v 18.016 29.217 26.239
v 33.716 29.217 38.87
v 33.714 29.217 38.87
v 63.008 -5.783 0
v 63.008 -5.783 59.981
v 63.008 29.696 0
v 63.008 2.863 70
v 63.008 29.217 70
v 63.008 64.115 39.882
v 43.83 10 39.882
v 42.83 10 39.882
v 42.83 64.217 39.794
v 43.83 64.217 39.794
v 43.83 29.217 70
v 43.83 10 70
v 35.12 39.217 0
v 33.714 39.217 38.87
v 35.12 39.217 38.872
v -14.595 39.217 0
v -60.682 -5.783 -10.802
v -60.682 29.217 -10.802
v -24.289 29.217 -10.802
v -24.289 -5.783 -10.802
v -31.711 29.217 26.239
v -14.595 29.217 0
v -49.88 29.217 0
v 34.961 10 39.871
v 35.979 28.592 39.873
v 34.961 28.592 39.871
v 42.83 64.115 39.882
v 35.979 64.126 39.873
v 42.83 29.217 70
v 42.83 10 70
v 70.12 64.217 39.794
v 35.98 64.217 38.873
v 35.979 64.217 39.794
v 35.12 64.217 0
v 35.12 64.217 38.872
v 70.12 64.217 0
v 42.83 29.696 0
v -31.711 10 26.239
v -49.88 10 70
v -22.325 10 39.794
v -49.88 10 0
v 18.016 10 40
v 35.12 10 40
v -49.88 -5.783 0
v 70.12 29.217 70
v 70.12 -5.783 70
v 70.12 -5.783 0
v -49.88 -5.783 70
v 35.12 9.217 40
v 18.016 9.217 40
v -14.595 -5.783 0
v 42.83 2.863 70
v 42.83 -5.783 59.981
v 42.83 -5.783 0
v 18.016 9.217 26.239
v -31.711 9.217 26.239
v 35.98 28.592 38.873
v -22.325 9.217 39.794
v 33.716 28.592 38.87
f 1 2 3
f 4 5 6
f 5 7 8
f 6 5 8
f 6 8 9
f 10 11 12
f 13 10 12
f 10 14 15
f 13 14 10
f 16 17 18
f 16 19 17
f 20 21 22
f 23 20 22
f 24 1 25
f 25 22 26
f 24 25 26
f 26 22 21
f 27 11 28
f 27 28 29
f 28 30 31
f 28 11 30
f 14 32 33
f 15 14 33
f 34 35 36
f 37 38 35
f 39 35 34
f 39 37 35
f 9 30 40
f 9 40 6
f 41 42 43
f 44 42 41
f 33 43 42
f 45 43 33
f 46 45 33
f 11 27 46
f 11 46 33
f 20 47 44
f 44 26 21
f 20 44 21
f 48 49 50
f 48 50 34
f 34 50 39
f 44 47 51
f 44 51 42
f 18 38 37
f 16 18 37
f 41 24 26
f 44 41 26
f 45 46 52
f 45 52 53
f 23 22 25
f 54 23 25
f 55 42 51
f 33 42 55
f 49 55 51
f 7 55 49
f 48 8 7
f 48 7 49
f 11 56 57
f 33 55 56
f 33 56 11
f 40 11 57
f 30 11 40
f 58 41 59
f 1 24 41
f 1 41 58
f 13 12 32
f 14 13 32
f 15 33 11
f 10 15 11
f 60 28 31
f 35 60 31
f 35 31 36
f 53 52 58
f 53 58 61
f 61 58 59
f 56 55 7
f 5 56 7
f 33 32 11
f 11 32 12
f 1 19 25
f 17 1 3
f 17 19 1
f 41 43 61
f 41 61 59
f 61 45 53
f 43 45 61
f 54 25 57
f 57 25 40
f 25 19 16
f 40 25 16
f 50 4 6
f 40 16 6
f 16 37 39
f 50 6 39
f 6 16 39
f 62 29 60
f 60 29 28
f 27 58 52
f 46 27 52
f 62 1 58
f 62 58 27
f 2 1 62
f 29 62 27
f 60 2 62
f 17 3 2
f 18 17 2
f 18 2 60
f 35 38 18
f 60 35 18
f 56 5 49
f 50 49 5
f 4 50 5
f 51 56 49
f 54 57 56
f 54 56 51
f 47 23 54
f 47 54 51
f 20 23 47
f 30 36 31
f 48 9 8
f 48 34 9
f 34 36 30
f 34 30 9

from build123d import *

# Parameters (mm, degrees)
SKETCH1_W           = 120
SKETCH1_H           = 70
BOSS_EXTRUDE1_DEPTH = 70
CUT_EXTRUDE1_DEPTH  = 150
SKETCH5_W           = 20.177747719
SKETCH5_H           = 66.048531366
CUT_EXTRUDE3_DEPTH  = 150
CUT_EXTRUDE4_DEPTH  = 25
CUT_EXTRUDE5_DEPTH  = 35
BOSS_EXTRUDE2_DEPTH = 35
CUT_EXTRUDE6_DEPTH  = 55
SKETCH14_W          = 58.303279042
SKETCH14_H          = 35.625039804
CUT_EXTRUDE7_DEPTH  = 1
BOSS_EXTRUDE5_DEPTH = 1
CUT_EXTRUDE9_DEPTH  = 20
CUT_EXTRUDE10_DEPTH = 20


with BuildPart() as part:
    # Sketch1 → Boss-Extrude1 (new body)
    with BuildSketch(Plane.XY):
        with Locations((10.120481928, 29.21686747)):
            Rectangle(SKETCH1_W, SKETCH1_H)
    extrude(amount=BOSS_EXTRUDE1_DEPTH)

    # Sketch3 → Cut-Extrude1 (cut)
    with BuildSketch(Plane(origin=(70.120481928, 0, 0), x_dir=(0, 0, -1), z_dir=(1, 0, 0))):
        Polygon((-39.794288679, 64.21686747), (-70, 29.21686747), (-70, 64.21686747), align=None)
    extrude(amount=-CUT_EXTRUDE1_DEPTH, mode=Mode.SUBTRACT)

    # Sketch5 → Cut-Extrude3 (cut)
    with BuildSketch(Plane(origin=(0, 47.095410713, 54.570453827), x_dir=(1, 0, 0), z_dir=(0, 0.653352699, 0.757053665))):
        with Locations((52.91919907, -10.542758773)):
            Rectangle(SKETCH5_W, SKETCH5_H)
    extrude(amount=-CUT_EXTRUDE3_DEPTH, mode=Mode.SUBTRACT)

    # Sketch6 → Cut-Extrude4 (cut)
    with BuildSketch(Plane(origin=(0, 64.21686747, 0), x_dir=(1, 0, 0), z_dir=(0, 1, 0))):
        Polygon((35.120481928, 0), (-14.879518072, 0), (35.120481928, -40), align=None)
    extrude(amount=-CUT_EXTRUDE4_DEPTH, mode=Mode.SUBTRACT)

    # Sketch9 → Cut-Extrude5 (cut)
    with BuildSketch(Plane(origin=(0, 64.21686747, 0), x_dir=(1, 0, 0), z_dir=(0, 1, 0))):
        Polygon((12.260999006, -39.794288679), (-22.324601561, -39.794288679), (-49.879518072, 0), (-58.507323934, 12.460113859), (-30.081695552, 12.460113859), (34.863342776, -39.794288679), align=None)
    extrude(amount=-CUT_EXTRUDE5_DEPTH, mode=Mode.SUBTRACT)

    # Sketch10 → Boss-Extrude2 (add)
    with BuildSketch(Plane(origin=(0, 29.21686747, 0), x_dir=(1, 0, 0), z_dir=(0, 1, 0))):
        Polygon((-49.879518072, 0), (-60.681640724, 10.802122652), (-24.289355103, 10.802122652), (-14.595487063, 0), align=None)
    extrude(amount=-BOSS_EXTRUDE2_DEPTH)

    # Sketch13 → Cut-Extrude6 (cut)
    with BuildSketch(Plane(origin=(0, 65, 0), x_dir=(1, 0, 0), z_dir=(0, 1, 0))):
        Polygon((-49.879518072, 0), (-49.879518072, -70), (42.83032521, -70), (42.83032521, -39.882100619), (-22.324601561, -39.794288679), align=None)
    extrude(amount=-CUT_EXTRUDE6_DEPTH, mode=Mode.SUBTRACT)

    # Sketch14 → Cut-Extrude7 (cut)
    with BuildSketch(Plane(origin=(-0.053672831, 0, 39.824304114), x_dir=(0.999999092, 0, 0.001347739), z_dir=(-0.001347739, 0, 0.999999092))):
        with Locations((6.880690565, 46.404347568)):
            Rectangle(SKETCH14_W, SKETCH14_H)
    extrude(amount=-CUT_EXTRUDE7_DEPTH, mode=Mode.SUBTRACT)

    # Sketch17 → Cut-Extrude9 (cut)
    with BuildSketch(Plane(origin=(0, 29.21686747, 0), x_dir=(1, 0, 0), z_dir=(0, 1, 0))):
        Polygon((18.016338489, -26.239286383), (35.120481928, -40), (18.016338489, -40), align=None)
    extrude(amount=-CUT_EXTRUDE9_DEPTH, mode=Mode.SUBTRACT)

    # Sketch18 → Cut-Extrude10 (cut)
    with BuildSketch(Plane(origin=(0, 29.21686747, 0), x_dir=(1, 0, 0), z_dir=(0, 1, 0))):
        Polygon((18.016338489, -40), (-22.324601561, -39.794288679), (-31.710545347, -26.239286383), (18.016338489, -26.239286383), align=None)
    extrude(amount=-CUT_EXTRUDE10_DEPTH, mode=Mode.SUBTRACT)


with BuildPart() as body_2:
    # Sketch16 → Boss-Extrude5 (new body)
    with BuildSketch(Plane(origin=(42.83032521, 0, 0), x_dir=(0, 0, -1), z_dir=(1, 0, 0))):
        Polygon((-39.794288679, 64.21686747), (-70, 29.21686747), (-70, 11.71686747), (-70, 10), (-39.882100619, 10), align=None)
    extrude(amount=BOSS_EXTRUDE5_DEPTH)


solid = Compound([part.part, body_2.part])
